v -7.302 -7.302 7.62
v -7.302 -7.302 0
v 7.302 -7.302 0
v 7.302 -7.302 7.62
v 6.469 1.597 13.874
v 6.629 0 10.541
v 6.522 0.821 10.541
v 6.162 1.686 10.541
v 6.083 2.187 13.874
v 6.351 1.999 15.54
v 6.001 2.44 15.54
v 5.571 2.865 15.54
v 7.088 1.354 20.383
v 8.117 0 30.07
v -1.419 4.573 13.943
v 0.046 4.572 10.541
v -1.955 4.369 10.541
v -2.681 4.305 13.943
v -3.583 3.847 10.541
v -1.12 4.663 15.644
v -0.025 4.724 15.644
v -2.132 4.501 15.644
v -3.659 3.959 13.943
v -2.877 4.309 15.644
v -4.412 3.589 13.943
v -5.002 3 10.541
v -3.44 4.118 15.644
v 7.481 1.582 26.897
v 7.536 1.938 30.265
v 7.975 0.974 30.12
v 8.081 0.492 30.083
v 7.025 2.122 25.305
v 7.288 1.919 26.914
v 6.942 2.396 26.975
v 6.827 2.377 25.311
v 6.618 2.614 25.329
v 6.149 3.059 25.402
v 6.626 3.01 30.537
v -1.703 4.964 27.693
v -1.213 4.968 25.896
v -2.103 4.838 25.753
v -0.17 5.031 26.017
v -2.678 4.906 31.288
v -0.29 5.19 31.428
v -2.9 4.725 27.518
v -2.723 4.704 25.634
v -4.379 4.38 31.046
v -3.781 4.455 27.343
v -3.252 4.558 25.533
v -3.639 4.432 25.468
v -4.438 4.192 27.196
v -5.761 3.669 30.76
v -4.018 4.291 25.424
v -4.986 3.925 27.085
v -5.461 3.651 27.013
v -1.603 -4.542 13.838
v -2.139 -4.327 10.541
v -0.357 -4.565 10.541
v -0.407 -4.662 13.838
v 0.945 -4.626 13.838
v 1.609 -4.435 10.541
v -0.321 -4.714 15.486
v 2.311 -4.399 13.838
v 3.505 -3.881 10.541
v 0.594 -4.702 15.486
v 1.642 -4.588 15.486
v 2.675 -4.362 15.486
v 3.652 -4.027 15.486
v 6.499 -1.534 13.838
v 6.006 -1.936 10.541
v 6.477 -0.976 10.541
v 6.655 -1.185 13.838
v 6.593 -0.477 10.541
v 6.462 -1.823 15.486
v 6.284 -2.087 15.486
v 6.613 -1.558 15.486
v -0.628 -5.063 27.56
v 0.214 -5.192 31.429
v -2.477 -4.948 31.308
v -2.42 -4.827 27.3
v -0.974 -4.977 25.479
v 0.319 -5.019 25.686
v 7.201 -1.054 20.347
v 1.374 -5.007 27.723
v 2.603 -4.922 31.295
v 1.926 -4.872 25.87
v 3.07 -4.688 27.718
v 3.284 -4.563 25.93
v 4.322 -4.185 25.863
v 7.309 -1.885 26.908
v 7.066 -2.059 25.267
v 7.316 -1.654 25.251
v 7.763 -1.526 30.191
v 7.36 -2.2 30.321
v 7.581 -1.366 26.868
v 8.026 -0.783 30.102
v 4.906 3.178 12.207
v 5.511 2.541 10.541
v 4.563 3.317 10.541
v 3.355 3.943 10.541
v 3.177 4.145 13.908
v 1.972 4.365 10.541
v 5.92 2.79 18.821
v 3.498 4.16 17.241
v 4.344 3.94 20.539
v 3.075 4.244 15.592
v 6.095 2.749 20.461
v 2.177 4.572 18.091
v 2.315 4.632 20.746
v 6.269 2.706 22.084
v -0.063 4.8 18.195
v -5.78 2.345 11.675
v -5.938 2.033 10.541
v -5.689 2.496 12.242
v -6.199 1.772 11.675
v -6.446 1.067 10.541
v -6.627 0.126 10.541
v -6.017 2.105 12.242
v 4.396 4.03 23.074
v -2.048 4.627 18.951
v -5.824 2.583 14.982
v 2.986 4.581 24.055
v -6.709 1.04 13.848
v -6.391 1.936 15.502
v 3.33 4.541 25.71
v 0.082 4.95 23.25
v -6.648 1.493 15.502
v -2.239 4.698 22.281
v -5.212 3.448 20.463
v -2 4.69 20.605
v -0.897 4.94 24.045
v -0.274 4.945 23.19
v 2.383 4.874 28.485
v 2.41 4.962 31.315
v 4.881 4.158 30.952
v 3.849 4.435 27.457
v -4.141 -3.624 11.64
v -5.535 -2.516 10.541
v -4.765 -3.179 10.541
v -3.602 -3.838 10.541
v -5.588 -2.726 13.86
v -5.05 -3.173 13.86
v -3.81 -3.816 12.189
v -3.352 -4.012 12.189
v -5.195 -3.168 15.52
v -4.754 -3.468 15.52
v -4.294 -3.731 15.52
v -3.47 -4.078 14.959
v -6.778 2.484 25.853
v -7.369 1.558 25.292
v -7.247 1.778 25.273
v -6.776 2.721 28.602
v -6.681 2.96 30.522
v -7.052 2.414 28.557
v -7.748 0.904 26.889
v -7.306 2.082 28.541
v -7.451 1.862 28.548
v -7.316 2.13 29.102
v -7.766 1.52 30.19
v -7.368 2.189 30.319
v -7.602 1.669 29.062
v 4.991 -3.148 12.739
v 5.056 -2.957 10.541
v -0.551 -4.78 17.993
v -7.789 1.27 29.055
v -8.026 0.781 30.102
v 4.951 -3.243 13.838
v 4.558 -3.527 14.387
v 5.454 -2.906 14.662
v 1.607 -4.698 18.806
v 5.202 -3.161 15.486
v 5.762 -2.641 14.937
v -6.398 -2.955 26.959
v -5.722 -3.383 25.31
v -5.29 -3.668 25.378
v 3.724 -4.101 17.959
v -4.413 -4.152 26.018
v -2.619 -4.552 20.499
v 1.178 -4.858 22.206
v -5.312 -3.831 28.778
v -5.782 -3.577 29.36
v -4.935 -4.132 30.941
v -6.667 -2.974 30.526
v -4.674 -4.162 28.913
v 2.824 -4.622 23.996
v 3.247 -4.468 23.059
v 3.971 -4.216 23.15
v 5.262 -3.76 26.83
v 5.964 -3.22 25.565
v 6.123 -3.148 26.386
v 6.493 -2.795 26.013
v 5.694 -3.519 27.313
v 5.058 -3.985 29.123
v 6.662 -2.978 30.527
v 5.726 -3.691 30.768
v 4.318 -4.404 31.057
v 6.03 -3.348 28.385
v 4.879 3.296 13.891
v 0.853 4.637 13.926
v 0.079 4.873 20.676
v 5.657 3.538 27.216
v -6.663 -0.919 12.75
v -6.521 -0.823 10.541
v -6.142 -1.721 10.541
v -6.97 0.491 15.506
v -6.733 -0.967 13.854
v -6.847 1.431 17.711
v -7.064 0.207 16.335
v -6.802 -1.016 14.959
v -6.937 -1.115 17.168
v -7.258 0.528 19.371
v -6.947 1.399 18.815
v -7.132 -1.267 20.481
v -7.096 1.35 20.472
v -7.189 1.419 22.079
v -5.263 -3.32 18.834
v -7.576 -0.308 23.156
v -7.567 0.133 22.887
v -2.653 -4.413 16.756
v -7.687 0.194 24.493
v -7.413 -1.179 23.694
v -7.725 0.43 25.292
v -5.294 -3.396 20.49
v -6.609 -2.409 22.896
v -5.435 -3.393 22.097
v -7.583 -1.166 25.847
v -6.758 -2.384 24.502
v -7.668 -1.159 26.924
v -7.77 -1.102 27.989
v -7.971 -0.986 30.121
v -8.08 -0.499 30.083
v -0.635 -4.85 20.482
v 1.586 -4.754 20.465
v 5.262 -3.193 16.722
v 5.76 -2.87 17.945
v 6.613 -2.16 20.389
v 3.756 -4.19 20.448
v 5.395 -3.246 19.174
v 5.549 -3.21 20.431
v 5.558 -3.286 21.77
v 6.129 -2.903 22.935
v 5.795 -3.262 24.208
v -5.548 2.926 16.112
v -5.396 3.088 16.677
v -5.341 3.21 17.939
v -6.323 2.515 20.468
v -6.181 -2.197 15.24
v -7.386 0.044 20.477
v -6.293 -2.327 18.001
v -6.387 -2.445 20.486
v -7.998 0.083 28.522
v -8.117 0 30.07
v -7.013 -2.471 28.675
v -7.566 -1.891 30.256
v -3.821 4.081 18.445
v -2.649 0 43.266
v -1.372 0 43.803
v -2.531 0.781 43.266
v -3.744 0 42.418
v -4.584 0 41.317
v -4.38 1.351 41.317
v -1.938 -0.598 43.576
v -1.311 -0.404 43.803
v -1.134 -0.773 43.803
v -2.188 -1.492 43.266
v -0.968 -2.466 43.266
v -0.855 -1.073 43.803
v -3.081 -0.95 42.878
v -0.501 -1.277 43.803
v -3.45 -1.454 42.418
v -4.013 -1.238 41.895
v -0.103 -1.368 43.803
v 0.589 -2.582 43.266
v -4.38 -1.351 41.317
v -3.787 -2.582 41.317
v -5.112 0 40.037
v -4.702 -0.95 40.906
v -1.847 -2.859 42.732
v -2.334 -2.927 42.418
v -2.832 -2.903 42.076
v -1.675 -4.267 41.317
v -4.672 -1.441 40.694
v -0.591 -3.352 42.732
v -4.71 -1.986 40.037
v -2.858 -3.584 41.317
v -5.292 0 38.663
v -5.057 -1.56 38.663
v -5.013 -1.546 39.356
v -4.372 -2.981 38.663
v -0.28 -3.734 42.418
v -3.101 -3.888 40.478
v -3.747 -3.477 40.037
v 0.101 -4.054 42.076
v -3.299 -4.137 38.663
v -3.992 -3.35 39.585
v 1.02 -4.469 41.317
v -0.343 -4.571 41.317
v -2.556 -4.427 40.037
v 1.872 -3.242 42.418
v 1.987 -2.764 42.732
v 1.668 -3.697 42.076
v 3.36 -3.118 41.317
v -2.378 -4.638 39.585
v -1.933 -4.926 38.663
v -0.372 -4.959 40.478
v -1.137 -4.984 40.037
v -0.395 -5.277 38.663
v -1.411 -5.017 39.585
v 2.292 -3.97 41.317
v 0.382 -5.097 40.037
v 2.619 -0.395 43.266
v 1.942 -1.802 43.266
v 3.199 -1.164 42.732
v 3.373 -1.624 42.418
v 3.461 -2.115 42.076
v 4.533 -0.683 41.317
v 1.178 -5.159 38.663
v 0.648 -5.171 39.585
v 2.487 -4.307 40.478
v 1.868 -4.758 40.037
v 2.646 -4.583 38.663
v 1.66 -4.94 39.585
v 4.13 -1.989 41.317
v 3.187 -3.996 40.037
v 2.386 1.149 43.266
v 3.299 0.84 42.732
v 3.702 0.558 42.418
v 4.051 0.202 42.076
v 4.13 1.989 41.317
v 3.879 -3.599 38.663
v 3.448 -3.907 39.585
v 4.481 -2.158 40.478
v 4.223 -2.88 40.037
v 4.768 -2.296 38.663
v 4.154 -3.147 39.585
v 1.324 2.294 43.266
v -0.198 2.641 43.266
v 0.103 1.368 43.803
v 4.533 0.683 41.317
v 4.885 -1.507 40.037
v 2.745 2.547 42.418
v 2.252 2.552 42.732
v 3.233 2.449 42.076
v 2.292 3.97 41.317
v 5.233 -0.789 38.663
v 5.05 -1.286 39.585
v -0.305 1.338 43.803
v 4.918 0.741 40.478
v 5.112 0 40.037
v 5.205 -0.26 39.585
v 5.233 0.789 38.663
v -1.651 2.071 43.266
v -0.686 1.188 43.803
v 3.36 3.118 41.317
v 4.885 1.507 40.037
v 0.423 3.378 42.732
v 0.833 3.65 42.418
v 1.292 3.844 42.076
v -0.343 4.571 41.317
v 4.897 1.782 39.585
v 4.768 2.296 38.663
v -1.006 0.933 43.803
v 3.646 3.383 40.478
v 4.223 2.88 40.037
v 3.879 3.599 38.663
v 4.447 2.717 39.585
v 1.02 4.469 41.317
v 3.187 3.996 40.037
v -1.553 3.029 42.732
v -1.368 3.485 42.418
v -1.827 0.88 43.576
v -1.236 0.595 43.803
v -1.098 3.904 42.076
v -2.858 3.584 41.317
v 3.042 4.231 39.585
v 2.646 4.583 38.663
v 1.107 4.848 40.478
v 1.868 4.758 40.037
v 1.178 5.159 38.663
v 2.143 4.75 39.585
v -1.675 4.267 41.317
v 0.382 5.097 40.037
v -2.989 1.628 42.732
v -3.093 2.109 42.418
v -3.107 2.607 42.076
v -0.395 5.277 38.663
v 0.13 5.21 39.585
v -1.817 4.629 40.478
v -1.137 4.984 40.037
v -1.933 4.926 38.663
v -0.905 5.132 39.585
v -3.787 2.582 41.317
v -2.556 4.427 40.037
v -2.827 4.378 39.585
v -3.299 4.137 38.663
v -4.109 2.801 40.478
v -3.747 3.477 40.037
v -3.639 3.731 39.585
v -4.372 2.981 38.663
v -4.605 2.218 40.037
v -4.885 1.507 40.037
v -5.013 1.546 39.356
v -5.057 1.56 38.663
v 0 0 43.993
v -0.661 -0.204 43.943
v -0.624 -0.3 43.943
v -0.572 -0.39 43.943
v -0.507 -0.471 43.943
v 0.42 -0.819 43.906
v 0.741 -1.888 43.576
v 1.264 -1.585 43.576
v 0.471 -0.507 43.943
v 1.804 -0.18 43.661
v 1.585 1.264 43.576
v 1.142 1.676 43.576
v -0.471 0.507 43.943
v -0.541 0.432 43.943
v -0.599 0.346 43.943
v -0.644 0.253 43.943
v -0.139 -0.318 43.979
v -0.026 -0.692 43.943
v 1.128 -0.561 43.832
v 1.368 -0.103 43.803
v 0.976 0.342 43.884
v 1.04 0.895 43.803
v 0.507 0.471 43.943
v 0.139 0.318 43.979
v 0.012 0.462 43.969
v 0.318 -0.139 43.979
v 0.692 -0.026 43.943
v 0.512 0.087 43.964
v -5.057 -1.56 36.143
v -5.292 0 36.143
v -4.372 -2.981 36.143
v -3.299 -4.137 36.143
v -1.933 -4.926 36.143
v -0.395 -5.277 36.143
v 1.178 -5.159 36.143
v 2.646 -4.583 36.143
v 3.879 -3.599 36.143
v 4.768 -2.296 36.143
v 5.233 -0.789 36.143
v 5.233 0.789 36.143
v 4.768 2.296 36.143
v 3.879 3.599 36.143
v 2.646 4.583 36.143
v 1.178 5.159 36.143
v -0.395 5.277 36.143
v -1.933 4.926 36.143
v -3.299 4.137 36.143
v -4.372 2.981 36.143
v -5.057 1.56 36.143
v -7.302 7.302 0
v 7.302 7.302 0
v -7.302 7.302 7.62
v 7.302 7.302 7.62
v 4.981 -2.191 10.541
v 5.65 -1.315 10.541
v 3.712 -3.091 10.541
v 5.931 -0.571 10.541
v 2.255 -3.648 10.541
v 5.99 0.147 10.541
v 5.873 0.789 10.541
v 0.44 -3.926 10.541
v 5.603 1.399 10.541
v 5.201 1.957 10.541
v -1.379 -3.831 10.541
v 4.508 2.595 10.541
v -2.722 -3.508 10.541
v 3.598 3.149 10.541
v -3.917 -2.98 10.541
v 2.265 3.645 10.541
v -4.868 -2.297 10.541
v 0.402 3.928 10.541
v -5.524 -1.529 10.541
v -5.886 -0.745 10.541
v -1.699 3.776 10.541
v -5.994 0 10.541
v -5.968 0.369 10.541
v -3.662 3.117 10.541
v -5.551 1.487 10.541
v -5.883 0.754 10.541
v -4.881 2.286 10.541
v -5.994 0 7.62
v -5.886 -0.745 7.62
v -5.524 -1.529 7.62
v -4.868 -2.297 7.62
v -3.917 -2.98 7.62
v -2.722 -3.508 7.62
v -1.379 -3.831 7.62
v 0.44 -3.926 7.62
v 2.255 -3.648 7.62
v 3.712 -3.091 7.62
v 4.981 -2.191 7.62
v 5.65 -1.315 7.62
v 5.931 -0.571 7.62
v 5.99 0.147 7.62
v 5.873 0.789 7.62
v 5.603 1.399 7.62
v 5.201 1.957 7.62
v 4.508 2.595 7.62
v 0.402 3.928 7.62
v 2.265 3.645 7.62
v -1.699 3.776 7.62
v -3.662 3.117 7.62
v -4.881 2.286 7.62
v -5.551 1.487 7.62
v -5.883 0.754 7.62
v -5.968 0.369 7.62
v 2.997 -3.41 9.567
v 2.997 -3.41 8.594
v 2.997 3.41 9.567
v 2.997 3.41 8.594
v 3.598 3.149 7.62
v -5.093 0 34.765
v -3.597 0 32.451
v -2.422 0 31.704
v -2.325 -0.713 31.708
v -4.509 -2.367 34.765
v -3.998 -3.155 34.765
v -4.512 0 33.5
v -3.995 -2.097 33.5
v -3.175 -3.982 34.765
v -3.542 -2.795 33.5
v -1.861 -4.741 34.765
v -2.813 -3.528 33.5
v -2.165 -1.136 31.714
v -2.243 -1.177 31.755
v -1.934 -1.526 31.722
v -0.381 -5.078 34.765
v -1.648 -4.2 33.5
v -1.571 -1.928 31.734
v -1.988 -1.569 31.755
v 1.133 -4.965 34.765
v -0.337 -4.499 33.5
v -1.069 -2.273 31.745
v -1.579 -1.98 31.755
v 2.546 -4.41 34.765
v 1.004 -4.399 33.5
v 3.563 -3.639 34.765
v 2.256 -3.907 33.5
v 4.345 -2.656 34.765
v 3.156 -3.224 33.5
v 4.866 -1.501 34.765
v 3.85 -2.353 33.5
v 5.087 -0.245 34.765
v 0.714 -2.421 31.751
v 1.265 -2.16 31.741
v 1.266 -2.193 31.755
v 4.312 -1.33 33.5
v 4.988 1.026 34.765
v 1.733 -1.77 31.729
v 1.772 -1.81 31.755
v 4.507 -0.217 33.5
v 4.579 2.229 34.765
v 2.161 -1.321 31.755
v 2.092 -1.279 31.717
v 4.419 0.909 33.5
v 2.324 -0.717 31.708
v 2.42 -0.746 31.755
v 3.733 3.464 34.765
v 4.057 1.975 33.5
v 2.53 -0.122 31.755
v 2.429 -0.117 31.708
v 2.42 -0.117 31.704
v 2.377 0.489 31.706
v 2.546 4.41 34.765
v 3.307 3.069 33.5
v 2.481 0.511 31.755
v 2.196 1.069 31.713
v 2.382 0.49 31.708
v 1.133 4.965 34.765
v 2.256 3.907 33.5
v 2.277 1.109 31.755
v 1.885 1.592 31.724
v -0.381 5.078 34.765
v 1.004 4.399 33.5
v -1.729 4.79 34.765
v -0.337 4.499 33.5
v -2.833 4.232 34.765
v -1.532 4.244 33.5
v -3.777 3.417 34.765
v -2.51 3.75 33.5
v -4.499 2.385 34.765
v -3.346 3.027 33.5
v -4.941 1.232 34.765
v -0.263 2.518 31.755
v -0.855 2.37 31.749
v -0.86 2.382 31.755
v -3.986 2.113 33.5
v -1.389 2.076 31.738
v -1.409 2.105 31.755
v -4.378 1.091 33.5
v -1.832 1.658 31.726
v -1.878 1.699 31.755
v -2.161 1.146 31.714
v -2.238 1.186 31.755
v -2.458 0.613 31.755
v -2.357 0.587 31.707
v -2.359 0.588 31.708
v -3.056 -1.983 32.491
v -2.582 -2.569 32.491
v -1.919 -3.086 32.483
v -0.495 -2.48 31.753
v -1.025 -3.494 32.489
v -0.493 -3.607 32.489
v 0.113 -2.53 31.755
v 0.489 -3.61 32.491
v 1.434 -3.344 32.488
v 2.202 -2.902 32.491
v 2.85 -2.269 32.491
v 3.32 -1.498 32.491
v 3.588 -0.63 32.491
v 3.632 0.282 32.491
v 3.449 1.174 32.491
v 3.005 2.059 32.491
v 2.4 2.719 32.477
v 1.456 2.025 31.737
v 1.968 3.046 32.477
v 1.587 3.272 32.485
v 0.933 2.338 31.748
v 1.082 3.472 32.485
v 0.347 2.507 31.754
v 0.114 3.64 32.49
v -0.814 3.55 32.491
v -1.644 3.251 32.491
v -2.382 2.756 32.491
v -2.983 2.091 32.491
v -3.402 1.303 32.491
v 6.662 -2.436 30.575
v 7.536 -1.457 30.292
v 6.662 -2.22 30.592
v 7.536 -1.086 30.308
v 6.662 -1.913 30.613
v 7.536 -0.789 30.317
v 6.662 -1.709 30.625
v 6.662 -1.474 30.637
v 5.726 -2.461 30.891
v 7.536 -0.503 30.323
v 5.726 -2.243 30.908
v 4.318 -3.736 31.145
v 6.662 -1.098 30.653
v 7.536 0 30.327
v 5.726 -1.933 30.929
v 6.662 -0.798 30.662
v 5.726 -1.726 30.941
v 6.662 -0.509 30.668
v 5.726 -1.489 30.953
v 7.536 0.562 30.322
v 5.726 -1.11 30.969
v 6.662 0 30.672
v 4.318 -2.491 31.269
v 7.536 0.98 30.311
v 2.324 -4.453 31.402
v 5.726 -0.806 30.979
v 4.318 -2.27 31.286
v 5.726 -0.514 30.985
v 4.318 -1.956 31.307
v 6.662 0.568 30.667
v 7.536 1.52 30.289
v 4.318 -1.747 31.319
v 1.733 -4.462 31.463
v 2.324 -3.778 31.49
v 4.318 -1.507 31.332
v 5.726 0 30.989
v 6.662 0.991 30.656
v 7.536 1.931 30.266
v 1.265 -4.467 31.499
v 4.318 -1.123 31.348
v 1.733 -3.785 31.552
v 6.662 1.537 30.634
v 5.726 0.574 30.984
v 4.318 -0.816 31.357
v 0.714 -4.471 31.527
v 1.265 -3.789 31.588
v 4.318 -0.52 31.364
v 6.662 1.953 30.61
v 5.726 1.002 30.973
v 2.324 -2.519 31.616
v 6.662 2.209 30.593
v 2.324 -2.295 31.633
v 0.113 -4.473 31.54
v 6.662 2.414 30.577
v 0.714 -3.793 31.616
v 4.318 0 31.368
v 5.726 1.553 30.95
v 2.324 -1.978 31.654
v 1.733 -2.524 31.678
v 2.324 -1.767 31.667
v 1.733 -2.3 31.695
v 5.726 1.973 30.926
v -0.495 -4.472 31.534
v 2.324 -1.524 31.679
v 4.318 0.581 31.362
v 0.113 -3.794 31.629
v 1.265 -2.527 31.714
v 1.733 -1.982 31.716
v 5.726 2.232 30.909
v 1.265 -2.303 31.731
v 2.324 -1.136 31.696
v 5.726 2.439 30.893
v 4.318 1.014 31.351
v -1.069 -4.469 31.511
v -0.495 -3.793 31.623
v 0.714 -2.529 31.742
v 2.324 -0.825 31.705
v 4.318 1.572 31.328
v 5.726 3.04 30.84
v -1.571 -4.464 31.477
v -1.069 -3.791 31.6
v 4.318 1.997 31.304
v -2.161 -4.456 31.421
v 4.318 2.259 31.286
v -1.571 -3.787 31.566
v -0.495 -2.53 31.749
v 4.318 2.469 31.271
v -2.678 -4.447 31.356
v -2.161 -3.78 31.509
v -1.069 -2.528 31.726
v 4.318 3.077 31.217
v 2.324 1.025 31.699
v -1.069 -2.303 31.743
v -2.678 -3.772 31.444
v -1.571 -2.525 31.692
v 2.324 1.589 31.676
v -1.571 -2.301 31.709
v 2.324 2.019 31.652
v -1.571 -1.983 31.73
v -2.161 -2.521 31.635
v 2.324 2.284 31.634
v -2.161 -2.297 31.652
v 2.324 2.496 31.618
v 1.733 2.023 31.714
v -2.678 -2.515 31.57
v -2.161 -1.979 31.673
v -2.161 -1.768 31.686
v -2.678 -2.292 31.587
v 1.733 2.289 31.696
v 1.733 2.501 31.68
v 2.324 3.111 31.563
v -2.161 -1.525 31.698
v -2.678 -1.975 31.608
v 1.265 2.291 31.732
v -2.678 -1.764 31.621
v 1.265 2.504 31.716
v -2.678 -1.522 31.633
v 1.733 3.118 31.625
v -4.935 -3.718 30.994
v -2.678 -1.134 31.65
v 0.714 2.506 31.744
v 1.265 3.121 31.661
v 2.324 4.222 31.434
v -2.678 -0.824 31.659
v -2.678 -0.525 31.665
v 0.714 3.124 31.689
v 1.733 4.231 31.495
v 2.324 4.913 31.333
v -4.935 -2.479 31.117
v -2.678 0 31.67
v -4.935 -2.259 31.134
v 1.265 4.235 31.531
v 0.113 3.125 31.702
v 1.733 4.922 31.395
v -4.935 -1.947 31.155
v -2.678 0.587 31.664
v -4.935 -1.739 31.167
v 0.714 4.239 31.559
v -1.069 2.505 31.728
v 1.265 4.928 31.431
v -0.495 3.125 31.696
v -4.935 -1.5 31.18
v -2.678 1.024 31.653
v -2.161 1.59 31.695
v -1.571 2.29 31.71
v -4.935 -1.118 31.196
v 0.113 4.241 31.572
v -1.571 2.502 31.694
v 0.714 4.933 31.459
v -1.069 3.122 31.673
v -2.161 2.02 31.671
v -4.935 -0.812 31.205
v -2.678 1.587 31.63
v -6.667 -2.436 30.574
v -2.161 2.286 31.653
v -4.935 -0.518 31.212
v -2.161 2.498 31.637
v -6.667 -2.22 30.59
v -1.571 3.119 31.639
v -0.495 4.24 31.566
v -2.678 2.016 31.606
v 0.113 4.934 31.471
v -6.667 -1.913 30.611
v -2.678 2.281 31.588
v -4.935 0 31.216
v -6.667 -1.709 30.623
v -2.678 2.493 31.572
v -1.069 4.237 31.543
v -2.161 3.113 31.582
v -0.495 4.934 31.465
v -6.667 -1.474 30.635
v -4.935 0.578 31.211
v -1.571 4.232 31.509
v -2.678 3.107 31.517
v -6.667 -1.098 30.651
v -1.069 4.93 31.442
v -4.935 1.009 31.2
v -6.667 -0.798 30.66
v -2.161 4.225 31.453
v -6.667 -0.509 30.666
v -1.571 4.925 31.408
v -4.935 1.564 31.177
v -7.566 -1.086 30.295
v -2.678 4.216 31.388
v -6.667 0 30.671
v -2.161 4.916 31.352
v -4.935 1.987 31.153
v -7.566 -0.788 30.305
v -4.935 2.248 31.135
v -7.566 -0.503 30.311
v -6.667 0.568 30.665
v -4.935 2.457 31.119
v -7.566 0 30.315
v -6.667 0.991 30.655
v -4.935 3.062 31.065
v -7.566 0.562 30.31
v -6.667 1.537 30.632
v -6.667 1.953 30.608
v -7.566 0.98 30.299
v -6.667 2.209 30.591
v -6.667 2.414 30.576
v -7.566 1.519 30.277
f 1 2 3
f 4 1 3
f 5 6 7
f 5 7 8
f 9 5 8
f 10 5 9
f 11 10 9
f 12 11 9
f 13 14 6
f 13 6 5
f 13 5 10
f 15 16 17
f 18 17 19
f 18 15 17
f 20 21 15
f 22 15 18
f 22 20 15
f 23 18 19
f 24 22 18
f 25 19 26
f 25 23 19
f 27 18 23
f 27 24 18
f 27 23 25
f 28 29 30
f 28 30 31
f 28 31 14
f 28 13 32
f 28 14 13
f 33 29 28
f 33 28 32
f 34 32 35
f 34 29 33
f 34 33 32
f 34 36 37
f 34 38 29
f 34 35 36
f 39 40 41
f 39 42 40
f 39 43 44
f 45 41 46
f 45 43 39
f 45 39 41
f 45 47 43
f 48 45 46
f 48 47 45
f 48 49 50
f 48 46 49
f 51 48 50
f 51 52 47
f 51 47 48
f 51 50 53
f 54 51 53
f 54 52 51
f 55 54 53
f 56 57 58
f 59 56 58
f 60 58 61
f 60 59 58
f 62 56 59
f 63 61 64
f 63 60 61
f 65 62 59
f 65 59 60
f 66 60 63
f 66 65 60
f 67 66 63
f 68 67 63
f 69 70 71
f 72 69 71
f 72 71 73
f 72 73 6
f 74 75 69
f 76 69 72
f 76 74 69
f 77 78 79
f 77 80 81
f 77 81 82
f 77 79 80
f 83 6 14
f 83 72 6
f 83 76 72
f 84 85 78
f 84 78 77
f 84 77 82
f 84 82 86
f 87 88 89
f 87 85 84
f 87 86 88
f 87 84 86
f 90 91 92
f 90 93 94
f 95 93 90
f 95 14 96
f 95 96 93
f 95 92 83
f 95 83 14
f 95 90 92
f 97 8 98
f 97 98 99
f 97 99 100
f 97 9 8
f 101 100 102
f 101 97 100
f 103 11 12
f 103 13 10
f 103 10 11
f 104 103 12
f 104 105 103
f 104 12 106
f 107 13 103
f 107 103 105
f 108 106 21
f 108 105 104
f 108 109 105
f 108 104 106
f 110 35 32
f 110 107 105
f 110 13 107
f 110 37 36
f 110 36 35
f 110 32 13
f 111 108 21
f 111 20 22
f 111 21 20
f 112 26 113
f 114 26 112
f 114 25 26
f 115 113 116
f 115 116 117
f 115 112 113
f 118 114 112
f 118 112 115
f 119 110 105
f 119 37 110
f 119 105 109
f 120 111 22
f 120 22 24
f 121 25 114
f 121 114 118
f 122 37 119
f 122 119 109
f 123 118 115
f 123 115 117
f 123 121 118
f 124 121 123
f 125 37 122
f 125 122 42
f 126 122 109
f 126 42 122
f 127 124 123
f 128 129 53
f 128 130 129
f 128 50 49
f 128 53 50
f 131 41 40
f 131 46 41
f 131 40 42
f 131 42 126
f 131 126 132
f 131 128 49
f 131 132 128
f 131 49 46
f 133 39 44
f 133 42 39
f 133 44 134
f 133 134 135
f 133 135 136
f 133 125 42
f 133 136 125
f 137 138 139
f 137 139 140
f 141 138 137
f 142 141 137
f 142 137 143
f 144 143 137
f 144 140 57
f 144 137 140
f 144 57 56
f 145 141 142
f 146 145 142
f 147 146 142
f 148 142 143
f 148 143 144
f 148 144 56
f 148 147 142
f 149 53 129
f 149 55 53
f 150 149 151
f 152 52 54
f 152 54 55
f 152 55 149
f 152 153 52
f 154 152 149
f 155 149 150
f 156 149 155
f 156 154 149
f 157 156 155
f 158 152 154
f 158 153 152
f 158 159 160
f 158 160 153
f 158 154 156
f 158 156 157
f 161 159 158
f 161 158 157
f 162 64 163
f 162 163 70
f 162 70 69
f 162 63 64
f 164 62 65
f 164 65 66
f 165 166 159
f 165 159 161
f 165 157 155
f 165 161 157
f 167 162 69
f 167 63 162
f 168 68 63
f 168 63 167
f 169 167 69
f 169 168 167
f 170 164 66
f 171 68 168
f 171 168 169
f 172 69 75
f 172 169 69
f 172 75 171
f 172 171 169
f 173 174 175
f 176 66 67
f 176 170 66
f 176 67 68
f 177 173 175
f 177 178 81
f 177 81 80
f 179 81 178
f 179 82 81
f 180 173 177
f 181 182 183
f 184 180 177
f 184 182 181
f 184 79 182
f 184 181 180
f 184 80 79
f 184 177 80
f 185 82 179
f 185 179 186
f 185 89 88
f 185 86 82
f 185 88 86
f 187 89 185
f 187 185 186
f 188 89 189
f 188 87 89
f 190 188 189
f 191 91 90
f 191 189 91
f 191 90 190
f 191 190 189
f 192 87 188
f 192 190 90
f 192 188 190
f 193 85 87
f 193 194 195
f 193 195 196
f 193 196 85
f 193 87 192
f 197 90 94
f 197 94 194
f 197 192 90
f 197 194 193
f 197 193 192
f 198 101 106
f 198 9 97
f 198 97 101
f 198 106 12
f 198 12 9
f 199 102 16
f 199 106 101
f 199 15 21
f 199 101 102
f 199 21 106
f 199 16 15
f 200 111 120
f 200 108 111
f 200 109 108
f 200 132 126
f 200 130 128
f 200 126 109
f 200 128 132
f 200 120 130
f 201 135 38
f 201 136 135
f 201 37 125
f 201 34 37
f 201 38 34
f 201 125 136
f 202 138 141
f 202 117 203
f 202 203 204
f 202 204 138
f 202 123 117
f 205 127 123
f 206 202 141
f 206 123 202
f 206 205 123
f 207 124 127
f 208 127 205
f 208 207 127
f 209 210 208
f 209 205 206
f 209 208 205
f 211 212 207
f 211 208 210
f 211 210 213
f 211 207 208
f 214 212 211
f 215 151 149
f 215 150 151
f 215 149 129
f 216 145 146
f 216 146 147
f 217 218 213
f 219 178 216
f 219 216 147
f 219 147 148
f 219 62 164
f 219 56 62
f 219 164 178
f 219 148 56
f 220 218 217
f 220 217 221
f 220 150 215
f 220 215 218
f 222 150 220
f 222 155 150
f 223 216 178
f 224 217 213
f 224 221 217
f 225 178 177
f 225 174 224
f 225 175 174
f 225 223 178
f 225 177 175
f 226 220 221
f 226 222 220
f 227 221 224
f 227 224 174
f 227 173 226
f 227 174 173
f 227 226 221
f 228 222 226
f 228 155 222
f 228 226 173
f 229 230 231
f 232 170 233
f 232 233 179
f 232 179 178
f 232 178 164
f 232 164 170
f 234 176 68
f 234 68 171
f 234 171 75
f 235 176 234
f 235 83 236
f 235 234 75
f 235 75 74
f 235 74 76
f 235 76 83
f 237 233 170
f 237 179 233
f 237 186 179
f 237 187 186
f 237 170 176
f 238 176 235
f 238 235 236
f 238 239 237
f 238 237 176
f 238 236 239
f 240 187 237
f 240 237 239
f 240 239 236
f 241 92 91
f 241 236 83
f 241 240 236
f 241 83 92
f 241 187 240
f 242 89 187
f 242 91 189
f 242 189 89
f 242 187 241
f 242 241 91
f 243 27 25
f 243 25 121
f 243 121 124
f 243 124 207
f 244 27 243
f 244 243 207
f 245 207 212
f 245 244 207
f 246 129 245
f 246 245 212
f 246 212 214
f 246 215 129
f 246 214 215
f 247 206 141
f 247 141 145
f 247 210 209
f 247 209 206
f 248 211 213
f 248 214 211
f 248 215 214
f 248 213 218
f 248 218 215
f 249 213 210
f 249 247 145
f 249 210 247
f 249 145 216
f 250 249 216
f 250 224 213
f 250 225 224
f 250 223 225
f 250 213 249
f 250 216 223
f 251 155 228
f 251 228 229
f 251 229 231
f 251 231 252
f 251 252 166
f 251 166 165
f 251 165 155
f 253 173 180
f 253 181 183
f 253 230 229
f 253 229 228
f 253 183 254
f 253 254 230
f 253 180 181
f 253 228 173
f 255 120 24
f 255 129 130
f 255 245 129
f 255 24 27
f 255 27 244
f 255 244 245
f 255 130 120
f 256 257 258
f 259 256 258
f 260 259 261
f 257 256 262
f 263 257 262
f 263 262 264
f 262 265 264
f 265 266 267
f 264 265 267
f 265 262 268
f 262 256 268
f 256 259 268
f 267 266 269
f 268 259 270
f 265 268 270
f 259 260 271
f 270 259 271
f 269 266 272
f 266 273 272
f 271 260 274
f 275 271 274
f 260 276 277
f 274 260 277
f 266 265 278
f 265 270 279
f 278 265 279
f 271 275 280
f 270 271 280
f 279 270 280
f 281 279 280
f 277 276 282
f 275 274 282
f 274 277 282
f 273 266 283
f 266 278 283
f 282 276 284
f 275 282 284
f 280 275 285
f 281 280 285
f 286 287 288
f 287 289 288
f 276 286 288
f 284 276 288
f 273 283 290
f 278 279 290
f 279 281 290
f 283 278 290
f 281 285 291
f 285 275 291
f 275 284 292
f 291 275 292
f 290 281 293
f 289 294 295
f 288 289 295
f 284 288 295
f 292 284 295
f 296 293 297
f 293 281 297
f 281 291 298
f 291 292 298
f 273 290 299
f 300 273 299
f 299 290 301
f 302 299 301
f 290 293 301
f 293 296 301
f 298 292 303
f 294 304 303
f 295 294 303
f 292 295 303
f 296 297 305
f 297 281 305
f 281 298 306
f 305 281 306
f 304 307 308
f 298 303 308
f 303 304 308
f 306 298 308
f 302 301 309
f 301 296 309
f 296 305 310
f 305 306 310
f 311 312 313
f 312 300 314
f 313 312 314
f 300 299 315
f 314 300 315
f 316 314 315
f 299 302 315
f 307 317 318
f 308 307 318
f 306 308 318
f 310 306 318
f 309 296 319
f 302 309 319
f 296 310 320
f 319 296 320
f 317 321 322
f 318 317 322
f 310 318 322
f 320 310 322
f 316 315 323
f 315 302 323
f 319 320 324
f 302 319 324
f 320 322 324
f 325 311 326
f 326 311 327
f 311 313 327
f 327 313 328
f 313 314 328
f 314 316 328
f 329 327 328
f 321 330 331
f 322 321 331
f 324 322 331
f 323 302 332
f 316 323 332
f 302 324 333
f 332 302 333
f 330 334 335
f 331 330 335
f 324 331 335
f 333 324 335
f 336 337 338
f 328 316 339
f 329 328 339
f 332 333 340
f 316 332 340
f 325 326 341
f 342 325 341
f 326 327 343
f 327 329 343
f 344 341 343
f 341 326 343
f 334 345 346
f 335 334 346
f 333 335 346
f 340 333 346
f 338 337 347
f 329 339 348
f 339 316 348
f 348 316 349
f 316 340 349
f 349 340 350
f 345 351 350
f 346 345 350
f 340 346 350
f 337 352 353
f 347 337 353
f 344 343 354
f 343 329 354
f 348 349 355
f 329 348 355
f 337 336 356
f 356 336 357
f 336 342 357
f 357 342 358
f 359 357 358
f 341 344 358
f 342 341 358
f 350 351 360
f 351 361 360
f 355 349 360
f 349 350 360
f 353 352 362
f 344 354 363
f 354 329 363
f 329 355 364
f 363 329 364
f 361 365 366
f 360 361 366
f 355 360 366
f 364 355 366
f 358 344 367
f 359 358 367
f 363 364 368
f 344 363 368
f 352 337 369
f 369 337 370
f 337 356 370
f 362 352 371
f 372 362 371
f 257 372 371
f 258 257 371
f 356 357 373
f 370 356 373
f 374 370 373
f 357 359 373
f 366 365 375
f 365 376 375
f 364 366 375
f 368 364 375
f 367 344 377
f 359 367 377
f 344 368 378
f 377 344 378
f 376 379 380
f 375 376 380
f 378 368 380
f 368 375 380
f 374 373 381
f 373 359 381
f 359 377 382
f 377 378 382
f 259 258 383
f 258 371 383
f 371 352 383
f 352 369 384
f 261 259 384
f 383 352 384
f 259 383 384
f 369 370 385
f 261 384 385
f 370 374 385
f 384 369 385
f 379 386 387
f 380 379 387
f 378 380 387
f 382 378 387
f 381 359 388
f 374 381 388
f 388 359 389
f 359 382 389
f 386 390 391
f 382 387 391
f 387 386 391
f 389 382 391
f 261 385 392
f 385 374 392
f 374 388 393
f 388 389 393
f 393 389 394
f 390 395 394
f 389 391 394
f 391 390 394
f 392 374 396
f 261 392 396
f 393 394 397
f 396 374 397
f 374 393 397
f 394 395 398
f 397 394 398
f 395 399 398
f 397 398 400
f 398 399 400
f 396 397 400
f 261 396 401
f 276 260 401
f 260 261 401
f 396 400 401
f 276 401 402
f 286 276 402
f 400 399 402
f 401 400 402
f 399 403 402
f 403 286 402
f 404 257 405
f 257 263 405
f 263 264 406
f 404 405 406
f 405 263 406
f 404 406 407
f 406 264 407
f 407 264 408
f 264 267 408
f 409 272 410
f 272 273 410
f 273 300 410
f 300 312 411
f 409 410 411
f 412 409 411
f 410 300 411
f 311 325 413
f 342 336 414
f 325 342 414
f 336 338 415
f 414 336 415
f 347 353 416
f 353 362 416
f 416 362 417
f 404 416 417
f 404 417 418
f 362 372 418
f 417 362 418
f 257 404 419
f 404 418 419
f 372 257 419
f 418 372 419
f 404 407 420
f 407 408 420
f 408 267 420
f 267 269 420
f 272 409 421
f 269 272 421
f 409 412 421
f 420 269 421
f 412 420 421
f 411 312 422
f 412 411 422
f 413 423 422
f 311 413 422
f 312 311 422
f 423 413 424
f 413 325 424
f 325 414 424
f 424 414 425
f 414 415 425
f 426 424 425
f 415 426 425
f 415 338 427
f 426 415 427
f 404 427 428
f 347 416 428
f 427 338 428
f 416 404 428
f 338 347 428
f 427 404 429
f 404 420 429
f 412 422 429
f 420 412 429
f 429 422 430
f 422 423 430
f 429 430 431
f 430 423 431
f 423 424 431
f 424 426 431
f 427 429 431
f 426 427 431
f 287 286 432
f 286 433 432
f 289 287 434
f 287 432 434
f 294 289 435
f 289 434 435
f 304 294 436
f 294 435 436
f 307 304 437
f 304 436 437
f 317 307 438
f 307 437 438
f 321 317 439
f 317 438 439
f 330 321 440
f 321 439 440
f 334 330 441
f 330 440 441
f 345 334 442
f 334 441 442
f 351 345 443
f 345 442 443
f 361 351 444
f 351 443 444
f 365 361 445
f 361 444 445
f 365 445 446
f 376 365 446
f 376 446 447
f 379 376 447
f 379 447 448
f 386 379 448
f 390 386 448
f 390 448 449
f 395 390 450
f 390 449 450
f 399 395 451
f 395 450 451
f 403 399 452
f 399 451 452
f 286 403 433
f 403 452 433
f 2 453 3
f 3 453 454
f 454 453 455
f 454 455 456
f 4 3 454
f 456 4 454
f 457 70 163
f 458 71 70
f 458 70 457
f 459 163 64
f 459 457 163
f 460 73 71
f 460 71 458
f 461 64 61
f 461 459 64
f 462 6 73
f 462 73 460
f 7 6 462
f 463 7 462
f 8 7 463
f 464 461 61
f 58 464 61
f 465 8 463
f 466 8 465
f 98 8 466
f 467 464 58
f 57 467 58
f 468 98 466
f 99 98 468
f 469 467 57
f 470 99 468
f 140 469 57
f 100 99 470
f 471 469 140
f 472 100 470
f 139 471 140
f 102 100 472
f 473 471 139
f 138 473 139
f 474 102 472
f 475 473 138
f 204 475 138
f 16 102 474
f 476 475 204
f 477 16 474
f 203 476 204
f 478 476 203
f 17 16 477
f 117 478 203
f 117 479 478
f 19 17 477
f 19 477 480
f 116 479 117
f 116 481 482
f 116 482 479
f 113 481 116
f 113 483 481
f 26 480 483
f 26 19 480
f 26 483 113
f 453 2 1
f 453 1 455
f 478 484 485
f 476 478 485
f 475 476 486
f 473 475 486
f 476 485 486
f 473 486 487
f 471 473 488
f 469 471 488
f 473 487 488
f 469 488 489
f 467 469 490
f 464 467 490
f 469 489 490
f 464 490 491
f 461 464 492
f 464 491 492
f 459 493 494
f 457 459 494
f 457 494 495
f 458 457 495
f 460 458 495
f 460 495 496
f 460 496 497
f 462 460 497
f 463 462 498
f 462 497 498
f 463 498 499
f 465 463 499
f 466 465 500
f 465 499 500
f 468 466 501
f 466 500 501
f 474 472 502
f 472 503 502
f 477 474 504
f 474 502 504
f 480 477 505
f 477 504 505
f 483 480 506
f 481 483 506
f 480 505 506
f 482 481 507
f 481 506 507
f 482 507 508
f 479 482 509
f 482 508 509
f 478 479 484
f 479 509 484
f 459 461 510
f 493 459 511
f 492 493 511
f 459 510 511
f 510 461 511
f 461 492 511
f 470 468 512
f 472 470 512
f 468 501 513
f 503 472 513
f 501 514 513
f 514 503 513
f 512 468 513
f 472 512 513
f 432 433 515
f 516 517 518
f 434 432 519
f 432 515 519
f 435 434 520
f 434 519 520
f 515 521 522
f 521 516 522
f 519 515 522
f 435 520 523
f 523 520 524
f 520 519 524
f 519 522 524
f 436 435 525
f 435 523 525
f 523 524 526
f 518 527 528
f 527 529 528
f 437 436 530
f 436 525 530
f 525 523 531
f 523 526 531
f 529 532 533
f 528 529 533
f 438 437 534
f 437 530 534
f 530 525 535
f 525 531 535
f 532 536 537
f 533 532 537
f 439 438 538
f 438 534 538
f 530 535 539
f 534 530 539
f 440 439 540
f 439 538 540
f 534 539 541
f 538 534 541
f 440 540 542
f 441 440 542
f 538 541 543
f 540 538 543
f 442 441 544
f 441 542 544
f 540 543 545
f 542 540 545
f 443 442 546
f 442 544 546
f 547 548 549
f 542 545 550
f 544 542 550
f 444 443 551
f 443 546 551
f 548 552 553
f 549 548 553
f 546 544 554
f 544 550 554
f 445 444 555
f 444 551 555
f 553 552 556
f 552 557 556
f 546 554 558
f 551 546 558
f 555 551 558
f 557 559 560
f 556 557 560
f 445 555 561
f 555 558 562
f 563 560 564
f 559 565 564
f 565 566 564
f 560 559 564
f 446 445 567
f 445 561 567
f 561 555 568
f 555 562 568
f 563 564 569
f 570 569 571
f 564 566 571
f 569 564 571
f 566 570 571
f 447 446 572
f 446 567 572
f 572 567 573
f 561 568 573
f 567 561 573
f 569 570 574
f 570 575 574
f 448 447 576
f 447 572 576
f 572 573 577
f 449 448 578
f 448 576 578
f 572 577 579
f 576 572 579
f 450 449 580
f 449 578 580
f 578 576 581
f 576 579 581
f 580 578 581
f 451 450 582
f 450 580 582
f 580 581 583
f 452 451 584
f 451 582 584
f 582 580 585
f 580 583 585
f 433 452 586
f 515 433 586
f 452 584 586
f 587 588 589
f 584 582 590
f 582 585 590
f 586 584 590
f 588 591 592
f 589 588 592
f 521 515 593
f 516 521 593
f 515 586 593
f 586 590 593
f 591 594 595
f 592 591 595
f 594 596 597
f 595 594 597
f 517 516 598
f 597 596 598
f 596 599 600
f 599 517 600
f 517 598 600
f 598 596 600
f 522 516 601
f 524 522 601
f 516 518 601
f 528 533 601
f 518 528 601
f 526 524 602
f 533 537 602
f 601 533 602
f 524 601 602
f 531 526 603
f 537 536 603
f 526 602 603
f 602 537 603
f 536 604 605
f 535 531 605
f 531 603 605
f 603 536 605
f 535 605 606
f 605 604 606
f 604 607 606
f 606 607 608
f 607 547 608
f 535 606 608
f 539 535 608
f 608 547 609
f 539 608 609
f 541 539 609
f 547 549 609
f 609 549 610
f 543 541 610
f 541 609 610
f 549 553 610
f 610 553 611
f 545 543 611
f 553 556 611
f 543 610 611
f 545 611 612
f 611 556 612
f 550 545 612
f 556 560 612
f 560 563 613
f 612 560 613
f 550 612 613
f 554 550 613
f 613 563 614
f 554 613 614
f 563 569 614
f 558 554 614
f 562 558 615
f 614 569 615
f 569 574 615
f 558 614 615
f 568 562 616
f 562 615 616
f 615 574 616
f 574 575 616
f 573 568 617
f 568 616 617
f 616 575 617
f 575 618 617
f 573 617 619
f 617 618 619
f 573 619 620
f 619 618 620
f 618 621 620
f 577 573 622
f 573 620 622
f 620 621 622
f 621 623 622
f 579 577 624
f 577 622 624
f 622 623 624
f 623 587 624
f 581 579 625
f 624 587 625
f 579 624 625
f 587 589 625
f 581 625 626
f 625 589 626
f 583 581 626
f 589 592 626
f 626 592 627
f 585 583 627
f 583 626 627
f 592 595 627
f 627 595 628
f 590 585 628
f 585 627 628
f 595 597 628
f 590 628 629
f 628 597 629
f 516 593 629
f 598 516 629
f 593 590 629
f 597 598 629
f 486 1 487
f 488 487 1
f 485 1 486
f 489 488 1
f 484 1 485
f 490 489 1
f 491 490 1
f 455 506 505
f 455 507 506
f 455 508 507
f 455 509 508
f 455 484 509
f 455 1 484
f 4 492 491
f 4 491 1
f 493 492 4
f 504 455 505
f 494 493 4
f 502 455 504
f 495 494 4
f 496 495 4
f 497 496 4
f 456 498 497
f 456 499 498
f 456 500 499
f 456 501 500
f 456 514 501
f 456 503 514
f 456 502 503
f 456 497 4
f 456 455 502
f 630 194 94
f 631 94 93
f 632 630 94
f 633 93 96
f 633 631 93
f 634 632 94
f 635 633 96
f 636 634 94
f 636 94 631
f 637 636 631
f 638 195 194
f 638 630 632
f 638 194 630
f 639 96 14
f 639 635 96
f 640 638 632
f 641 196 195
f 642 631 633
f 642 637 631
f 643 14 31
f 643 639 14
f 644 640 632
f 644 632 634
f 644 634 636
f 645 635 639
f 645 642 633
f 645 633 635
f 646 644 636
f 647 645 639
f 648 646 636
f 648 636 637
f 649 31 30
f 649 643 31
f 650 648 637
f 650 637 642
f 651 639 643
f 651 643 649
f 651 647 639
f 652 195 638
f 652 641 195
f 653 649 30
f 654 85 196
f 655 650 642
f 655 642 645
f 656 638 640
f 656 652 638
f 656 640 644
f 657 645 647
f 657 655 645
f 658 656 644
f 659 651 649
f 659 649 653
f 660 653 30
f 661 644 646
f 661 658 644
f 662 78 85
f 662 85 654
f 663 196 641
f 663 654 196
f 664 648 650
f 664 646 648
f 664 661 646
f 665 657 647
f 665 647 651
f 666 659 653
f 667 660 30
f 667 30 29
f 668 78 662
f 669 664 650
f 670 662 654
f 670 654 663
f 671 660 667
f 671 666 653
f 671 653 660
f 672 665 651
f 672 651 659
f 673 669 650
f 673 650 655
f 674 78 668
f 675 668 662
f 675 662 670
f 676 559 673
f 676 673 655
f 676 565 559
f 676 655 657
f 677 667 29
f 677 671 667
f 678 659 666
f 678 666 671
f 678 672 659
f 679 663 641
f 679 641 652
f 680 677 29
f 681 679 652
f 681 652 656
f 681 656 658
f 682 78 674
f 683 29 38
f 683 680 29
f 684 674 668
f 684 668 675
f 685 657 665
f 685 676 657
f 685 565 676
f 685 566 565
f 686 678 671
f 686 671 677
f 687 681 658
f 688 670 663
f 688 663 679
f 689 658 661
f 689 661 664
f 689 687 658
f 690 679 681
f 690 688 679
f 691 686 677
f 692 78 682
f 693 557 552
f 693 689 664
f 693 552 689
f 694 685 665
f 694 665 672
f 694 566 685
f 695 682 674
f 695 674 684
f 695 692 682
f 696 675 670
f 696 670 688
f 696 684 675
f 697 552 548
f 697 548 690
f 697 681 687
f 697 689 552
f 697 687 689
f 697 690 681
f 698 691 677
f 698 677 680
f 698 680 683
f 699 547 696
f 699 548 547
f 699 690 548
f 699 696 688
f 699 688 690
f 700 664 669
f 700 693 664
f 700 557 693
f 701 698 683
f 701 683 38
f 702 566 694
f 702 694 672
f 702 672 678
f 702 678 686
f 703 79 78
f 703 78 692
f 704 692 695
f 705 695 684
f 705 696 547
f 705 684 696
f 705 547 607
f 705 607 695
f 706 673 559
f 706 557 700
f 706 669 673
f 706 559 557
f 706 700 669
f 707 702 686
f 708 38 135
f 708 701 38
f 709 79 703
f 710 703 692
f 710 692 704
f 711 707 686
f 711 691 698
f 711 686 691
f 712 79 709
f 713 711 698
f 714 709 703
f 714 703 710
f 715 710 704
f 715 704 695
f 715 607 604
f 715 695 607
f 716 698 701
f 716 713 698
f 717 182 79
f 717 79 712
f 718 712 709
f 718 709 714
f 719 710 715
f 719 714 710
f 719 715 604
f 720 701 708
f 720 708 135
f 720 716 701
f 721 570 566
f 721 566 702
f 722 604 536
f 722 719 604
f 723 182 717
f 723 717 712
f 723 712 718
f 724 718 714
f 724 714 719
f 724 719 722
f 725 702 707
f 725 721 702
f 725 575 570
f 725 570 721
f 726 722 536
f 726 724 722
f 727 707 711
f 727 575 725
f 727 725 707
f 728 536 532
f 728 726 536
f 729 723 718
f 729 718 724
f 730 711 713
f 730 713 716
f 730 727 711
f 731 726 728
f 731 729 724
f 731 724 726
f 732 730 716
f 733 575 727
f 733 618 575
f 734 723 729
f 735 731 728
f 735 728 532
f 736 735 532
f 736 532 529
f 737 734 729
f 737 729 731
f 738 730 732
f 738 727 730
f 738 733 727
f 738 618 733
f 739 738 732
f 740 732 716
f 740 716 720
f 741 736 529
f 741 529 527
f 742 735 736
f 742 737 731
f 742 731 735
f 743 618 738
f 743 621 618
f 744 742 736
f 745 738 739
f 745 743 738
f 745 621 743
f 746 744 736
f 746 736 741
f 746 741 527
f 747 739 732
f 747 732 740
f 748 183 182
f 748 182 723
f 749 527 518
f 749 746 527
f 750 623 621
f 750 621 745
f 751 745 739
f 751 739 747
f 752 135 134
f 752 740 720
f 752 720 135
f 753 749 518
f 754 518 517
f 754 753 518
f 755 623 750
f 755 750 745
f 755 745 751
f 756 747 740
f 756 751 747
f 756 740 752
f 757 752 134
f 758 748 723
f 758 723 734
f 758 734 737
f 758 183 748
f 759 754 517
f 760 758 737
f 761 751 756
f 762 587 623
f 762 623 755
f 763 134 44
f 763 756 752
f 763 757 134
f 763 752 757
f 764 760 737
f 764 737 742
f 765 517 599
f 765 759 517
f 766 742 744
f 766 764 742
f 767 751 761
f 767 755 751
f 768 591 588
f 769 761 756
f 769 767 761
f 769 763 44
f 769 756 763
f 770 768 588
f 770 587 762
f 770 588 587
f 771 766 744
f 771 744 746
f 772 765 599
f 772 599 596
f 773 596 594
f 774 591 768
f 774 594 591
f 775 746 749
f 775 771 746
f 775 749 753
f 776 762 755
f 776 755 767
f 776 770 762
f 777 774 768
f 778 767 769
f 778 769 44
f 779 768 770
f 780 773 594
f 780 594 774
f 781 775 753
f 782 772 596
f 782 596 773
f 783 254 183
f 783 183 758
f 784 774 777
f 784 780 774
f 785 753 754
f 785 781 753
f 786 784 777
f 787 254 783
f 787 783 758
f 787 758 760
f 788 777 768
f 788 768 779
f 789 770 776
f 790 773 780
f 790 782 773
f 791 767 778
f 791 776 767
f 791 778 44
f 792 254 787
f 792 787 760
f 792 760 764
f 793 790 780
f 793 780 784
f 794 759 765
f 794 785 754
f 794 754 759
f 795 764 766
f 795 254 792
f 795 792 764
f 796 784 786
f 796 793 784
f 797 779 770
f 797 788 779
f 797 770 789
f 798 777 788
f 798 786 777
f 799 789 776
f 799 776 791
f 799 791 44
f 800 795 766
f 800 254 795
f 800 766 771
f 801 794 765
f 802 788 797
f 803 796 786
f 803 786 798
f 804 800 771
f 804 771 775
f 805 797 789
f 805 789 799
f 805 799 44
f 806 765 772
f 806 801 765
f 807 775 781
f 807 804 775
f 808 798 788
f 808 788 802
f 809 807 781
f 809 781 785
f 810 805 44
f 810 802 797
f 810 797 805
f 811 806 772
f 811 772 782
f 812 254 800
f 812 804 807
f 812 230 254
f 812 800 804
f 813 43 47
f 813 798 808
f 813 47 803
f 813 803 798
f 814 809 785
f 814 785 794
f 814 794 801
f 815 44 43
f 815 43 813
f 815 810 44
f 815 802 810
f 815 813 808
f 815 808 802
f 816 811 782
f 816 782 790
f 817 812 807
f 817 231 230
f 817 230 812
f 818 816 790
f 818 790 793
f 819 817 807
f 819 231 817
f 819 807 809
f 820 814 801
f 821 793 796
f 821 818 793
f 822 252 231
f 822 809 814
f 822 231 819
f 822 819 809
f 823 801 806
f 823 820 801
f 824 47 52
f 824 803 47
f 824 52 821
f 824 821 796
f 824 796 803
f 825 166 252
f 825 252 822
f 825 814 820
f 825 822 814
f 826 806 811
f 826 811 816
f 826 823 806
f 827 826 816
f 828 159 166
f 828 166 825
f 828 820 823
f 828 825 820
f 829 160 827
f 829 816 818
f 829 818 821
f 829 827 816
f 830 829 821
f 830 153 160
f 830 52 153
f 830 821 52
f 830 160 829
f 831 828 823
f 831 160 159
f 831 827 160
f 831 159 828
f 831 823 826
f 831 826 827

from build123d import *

# Parameters (mm, degrees)
F0_W     = 14.605
F0_H     = 14.605
F1_DEPTH = 7.62
F3_DEPTH = 2.921


with BuildPart() as f1:
    # F0 (on Top) → F1 (new body)
    with BuildSketch(Plane.XY):
        Rectangle(F0_W, F0_H)
    extrude(amount=F1_DEPTH)

    # F2 (on face) → F3 (join)
    with BuildSketch(Plane.XY.offset(7.62)):
        with BuildLine():
            add(Edge.make_bspline(
                [(-5.9944, 0), (-5.9944, -6.8190840294), (2.9972, -3.4095420147), (11.9888, 0), (2.9972, 3.4095420147), (-5.9944, 6.8190840294), (-5.9944, 0)],
                knots=[0, 0, 0, 2.0943951024, 2.0943951024, 4.1887902048, 4.1887902048, 6.2831853072, 6.2831853072, 6.2831853072], degree=2, weights=[1, 0.5, 1, 0.5, 1, 0.5, 1]))
        make_face()
    extrude(amount=F3_DEPTH)

    # F5 (on face) → F7 section 0
    with BuildSketch(Plane.XY.offset(10.541)):
        with BuildLine():
            add(Edge.make_bspline(
                [(6.6294, 0), (6.6294, 7.9189362922), (-3.3147, 3.9594681461), (-13.2588, 0), (-3.3147, -3.9594681461), (6.6294, -7.9189362922), (6.6294, 0)],
                knots=[0, 0, 0, 2.0943951024, 2.0943951024, 4.1887902048, 4.1887902048, 6.2831853072, 6.2831853072, 6.2831853072], degree=2, weights=[1, 0.5, 1, 0.5, 1, 0.5, 1]))
        make_face()
    # F6 (on offset) → F7 section 1
    with BuildSketch(Plane.XY.offset(31.877)):
        with BuildLine():
            add(Edge.make_bspline(
                [(8.255, 0), (8.255, 9.018788555), (-4.1275, 4.5093942775), (-16.51, 0), (-4.1275, -4.5093942775), (8.255, -9.018788555), (8.255, 0)],
                knots=[0, 0, 0, 2.0943951024, 2.0943951024, 4.1887902048, 4.1887902048, 6.2831853072, 6.2831853072, 6.2831853072], degree=2, weights=[1, 0.5, 1, 0.5, 1, 0.5, 1]))
        make_face()
    loft()

    # F8 (on Front) → F9 (revolve, intersect)
    with BuildSketch(Plane.XZ):
        with BuildLine():
            Line((7.3025, 0), (15.24, 24.422544986))
            ThreePointArc((15.24, 24.422544986), (0, 31.8560935557), (-15.24, 24.422544986))
            Line((-15.24, 24.422544986), (-7.3025, 0))
            Line((-7.3025, 0), (7.3025, 0))
        make_face()
    revolve(axis=Axis((0, 0, 0), (-1, 0, 0)), mode=Mode.INTERSECT)

    # F10 (on Front) → F11 (revolve)
    with BuildSketch(Plane.XZ):
        with BuildLine():
            ThreePointArc((-5.2916666667, 36.1427071672), (-3.7126915786, 32.5537193001), (0, 31.2928))
            Line((0, 31.2928), (0, 43.9928))
            ThreePointArc((0, 43.9928), (-3.7440562275, 42.4184357163), (-5.2916666667, 38.6632417318))
            Line((-5.2916666667, 38.6632417318), (-5.2916666667, 36.1427071672))
        make_face()
    revolve(axis=Axis((0, 0, 37.6428), (0, 0, 1)))


solid = f1.part
